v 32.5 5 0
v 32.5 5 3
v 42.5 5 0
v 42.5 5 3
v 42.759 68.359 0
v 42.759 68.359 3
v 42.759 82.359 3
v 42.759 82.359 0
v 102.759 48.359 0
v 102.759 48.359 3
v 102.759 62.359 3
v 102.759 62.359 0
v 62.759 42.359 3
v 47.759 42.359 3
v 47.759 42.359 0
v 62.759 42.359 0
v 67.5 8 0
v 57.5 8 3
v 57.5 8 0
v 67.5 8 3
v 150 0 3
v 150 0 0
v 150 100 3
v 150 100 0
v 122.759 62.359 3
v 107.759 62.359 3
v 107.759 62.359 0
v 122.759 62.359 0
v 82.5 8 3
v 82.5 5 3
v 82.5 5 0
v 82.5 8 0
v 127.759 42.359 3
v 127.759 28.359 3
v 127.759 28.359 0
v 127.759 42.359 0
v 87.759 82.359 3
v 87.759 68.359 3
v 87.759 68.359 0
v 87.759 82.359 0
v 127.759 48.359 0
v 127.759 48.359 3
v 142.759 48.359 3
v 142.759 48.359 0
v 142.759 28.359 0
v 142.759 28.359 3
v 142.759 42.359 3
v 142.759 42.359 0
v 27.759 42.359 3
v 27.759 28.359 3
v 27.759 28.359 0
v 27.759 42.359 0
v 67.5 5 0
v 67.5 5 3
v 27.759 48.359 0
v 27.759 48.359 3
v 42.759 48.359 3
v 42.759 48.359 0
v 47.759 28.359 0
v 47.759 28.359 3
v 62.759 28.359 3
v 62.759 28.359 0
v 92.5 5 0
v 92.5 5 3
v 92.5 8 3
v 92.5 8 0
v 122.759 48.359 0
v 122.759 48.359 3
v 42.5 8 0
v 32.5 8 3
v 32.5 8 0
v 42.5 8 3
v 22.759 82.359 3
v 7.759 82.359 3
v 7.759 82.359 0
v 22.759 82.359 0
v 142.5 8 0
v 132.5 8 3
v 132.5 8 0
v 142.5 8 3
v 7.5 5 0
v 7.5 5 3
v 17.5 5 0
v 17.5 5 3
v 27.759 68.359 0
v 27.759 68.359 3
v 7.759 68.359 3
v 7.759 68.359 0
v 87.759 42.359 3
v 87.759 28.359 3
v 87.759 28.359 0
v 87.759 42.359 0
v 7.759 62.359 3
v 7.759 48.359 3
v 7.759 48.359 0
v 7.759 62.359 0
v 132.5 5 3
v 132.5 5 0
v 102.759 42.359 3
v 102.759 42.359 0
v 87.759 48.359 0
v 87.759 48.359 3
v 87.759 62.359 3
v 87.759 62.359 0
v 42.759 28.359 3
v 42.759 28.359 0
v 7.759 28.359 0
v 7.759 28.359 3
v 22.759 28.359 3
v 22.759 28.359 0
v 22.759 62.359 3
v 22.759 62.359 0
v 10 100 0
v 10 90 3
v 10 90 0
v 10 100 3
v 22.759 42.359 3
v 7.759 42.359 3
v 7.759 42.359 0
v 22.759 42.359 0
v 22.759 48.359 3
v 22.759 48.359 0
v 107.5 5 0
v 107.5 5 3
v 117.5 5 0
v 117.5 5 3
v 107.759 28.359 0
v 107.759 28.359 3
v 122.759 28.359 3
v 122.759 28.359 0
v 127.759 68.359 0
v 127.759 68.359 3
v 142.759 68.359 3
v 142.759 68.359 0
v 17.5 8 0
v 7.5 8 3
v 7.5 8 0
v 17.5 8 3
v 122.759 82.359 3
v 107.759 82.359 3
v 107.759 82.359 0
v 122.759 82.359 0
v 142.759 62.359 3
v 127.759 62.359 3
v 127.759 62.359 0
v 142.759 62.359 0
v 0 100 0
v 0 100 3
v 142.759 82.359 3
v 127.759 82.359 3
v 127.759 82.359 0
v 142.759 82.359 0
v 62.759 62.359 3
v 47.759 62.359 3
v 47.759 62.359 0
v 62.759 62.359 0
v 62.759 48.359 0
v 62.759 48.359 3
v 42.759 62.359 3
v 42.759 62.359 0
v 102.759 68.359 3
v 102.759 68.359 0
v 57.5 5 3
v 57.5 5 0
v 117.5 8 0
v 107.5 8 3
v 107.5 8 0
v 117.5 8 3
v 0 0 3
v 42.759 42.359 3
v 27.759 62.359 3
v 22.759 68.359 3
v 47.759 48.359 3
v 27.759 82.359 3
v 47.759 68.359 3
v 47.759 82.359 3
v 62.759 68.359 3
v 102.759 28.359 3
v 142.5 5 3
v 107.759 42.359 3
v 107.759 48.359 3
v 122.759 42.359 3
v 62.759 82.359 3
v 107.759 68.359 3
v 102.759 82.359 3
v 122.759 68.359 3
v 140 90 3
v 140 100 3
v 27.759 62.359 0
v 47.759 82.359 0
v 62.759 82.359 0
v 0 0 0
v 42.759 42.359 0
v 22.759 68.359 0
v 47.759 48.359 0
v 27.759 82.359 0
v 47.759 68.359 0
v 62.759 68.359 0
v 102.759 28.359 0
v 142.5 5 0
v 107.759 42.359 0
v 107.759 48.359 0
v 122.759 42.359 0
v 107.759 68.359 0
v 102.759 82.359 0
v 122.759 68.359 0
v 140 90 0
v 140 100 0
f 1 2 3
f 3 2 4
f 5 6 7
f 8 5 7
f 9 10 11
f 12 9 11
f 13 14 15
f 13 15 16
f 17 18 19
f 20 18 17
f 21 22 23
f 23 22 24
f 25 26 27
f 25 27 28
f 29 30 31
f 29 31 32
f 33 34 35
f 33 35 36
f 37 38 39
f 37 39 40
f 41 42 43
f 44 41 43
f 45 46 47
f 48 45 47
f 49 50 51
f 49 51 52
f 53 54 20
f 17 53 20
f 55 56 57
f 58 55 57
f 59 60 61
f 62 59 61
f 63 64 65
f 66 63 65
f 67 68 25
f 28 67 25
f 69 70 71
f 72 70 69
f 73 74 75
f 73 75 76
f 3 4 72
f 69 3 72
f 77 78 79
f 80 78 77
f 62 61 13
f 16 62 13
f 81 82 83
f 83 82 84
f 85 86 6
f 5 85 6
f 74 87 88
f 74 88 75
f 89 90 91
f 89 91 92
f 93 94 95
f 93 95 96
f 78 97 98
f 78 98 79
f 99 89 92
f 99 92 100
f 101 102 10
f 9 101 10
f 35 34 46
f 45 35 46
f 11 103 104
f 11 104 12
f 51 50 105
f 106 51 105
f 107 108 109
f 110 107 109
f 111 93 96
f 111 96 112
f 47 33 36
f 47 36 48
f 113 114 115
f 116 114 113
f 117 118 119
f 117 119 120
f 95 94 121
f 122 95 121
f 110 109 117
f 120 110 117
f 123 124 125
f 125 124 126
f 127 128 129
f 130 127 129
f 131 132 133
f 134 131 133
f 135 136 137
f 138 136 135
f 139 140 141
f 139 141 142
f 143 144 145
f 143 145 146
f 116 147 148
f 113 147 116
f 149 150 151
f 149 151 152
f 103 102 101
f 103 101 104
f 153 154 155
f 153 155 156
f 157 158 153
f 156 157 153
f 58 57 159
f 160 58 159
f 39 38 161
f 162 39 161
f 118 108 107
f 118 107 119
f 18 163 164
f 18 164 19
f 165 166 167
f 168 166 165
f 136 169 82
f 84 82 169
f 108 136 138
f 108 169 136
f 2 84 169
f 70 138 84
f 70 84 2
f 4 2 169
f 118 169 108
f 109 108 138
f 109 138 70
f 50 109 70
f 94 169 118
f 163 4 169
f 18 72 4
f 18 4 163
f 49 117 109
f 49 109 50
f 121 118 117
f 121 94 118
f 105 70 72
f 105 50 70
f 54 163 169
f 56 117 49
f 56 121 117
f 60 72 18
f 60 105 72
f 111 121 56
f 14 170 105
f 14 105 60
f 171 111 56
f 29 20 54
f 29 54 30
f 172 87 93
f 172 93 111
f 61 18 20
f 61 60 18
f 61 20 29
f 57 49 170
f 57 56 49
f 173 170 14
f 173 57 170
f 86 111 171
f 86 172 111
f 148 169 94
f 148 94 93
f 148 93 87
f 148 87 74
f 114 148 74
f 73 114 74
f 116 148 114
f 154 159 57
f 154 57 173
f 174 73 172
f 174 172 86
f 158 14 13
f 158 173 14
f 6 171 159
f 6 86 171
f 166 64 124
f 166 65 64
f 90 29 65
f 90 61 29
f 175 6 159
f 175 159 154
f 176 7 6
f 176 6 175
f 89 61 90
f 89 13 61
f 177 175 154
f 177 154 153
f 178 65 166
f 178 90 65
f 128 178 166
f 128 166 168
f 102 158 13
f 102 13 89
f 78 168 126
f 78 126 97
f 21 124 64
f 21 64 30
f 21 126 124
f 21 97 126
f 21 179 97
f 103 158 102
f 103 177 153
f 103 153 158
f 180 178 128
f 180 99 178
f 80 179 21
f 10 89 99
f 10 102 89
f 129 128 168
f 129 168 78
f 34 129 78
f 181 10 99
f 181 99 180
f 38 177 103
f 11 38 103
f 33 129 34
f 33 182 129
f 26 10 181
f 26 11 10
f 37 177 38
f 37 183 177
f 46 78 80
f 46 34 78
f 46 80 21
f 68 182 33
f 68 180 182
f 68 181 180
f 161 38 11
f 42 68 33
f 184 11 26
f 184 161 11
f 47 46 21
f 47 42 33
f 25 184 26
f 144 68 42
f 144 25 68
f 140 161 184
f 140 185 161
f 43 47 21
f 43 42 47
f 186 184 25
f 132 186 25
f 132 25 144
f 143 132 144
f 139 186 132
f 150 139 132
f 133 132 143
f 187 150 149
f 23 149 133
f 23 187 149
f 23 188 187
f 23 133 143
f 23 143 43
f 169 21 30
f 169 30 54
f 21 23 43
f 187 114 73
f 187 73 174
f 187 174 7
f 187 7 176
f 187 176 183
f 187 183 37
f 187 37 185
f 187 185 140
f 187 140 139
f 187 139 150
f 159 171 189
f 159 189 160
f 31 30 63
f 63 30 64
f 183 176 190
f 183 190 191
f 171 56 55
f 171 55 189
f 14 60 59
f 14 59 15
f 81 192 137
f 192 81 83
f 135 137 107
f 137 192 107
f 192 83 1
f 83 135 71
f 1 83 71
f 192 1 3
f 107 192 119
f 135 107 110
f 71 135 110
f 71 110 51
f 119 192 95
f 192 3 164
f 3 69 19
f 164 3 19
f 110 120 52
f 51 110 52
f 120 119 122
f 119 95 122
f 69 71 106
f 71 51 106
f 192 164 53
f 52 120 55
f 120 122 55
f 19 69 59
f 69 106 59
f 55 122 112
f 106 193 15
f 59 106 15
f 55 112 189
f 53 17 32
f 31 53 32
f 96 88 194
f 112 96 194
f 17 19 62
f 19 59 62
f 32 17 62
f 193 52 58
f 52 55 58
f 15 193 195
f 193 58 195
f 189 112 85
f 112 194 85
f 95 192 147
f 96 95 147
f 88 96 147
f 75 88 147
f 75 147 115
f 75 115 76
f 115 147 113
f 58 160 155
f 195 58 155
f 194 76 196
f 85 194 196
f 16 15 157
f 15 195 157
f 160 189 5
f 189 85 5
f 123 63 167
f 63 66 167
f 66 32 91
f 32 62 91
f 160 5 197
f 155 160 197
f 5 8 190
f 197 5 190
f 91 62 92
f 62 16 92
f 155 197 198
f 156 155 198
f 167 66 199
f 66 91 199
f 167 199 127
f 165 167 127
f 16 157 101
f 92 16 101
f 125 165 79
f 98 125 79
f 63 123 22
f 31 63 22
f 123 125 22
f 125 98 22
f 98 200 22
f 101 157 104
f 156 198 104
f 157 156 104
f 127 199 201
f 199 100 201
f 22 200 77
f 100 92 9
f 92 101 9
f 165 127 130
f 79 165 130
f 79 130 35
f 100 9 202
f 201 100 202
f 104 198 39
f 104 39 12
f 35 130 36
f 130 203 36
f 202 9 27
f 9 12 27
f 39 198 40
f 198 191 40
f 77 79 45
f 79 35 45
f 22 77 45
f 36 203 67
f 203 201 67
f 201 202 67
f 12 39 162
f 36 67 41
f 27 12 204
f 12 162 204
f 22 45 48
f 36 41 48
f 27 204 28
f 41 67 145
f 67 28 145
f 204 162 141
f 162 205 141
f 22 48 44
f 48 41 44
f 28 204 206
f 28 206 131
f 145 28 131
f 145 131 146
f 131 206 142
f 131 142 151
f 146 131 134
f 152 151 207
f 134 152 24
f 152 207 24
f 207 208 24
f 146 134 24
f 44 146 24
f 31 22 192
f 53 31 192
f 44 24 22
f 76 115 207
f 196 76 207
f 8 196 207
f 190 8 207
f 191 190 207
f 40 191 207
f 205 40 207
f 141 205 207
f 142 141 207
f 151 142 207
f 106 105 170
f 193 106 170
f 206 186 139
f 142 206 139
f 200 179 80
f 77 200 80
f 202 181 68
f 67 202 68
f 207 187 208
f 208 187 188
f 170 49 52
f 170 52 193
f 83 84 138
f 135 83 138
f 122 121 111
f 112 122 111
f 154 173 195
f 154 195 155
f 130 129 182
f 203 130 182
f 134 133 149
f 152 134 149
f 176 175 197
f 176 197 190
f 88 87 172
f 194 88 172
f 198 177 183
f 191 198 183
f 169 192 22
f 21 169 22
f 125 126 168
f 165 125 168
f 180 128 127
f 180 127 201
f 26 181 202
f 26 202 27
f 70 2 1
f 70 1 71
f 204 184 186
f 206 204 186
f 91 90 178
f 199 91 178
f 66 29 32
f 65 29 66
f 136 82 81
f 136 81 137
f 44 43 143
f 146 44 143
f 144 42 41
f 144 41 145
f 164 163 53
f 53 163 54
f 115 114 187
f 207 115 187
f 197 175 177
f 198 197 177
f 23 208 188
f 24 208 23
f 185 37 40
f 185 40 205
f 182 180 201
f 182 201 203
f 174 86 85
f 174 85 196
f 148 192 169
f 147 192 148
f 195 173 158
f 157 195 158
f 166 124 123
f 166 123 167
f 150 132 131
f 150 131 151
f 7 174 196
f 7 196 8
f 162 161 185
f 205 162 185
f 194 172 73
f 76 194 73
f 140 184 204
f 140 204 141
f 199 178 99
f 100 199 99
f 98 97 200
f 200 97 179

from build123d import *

# Parameters (mm, degrees)
ESQUISSE1_W             = 150
ESQUISSE1_H             = 100
BOSS_EXTRU_1_DEPTH      = 3
ESQUISSE3_W             = 130
ESQUISSE3_H             = 10
ENL_V_MAT_EXTRU_1_DEPTH = 3
ESQUISSE12_W            = 10
ESQUISSE12_H            = 3
ENL_V_MAT_EXTRU_3_DEPTH = 10
ESQUISSE13_W            = 15
ESQUISSE13_H            = 14
ENL_V_MAT_EXTRU_4_DEPTH = 10


with BuildPart() as part:
    # Esquisse1 → Boss.-Extru.1 (new body)
    with BuildSketch(Plane.XY):
        with Locations((75, 50)):
            Rectangle(ESQUISSE1_W, ESQUISSE1_H)
    extrude(amount=BOSS_EXTRU_1_DEPTH)

    # Esquisse3 → Enlèv. mat.-Extru.1 (cut)
    with BuildSketch(Plane.XY.offset(3)):
        with Locations((75, 95)):
            Rectangle(ESQUISSE3_W, ESQUISSE3_H)
    extrude(amount=-ENL_V_MAT_EXTRU_1_DEPTH, mode=Mode.SUBTRACT)

    # Esquisse12 → Enlèv. mat.-Extru.3 (cut)
    with BuildSketch(Plane.XY.offset(3)):
        with Locations((12.5, 6.5)):
            Rectangle(ESQUISSE12_W, ESQUISSE12_H)
        with Locations((37.5, 6.5)):
            Rectangle(ESQUISSE12_W, ESQUISSE12_H)
        with Locations((62.5, 6.5)):
            Rectangle(ESQUISSE12_W, ESQUISSE12_H)
        with Locations((87.5, 6.5)):
            Rectangle(ESQUISSE12_W, ESQUISSE12_H)
        with Locations((112.5, 6.5)):
            Rectangle(ESQUISSE12_W, ESQUISSE12_H)
        with Locations((137.5, 6.5)):
            Rectangle(ESQUISSE12_W, ESQUISSE12_H)
    extrude(amount=-ENL_V_MAT_EXTRU_3_DEPTH, mode=Mode.SUBTRACT)

    # Esquisse13 → Enlèv. mat.-Extru.4 (cut)
    with BuildSketch(Plane.XY.offset(3)):
        with Locations((35.259475166, 75.358514873)):
            Rectangle(ESQUISSE13_W, ESQUISSE13_H)
        with Locations((15.259475166, 75.358514873)):
            Rectangle(ESQUISSE13_W, ESQUISSE13_H)
        with Locations((55.259475166, 75.358514873)):
            Rectangle(ESQUISSE13_W, ESQUISSE13_H)
        with Locations((95.259475166, 75.358514873)):
            Rectangle(ESQUISSE13_W, ESQUISSE13_H)
        with Locations((115.259475166, 75.358514873)):
            Rectangle(ESQUISSE13_W, ESQUISSE13_H)
        with Locations((135.259475166, 75.358514873)):
            Rectangle(ESQUISSE13_W, ESQUISSE13_H)
        with Locations((15.259475166, 55.358514873)):
            Rectangle(ESQUISSE13_W, ESQUISSE13_H)
        with Locations((35.259475166, 55.358514873)):
            Rectangle(ESQUISSE13_W, ESQUISSE13_H)
        with Locations((55.259475166, 55.358514873)):
            Rectangle(ESQUISSE13_W, ESQUISSE13_H)
        with Locations((95.259475166, 55.358514873)):
            Rectangle(ESQUISSE13_W, ESQUISSE13_H)
        with Locations((115.259475166, 55.358514873)):
            Rectangle(ESQUISSE13_W, ESQUISSE13_H)
        with Locations((135.259475166, 55.358514873)):
            Rectangle(ESQUISSE13_W, ESQUISSE13_H)
        with Locations((15.259475166, 35.358514873)):
            Rectangle(ESQUISSE13_W, ESQUISSE13_H)
        with Locations((35.259475166, 35.358514873)):
            Rectangle(ESQUISSE13_W, ESQUISSE13_H)
        with Locations((55.259475166, 35.358514873)):
            Rectangle(ESQUISSE13_W, ESQUISSE13_H)
        with Locations((95.259475166, 35.358514873)):
            Rectangle(ESQUISSE13_W, ESQUISSE13_H)
        with Locations((115.259475166, 35.358514873)):
            Rectangle(ESQUISSE13_W, ESQUISSE13_H)
        with Locations((135.259475166, 35.358514873)):
            Rectangle(ESQUISSE13_W, ESQUISSE13_H)
    extrude(amount=-ENL_V_MAT_EXTRU_4_DEPTH, mode=Mode.SUBTRACT)


solid = part.part
